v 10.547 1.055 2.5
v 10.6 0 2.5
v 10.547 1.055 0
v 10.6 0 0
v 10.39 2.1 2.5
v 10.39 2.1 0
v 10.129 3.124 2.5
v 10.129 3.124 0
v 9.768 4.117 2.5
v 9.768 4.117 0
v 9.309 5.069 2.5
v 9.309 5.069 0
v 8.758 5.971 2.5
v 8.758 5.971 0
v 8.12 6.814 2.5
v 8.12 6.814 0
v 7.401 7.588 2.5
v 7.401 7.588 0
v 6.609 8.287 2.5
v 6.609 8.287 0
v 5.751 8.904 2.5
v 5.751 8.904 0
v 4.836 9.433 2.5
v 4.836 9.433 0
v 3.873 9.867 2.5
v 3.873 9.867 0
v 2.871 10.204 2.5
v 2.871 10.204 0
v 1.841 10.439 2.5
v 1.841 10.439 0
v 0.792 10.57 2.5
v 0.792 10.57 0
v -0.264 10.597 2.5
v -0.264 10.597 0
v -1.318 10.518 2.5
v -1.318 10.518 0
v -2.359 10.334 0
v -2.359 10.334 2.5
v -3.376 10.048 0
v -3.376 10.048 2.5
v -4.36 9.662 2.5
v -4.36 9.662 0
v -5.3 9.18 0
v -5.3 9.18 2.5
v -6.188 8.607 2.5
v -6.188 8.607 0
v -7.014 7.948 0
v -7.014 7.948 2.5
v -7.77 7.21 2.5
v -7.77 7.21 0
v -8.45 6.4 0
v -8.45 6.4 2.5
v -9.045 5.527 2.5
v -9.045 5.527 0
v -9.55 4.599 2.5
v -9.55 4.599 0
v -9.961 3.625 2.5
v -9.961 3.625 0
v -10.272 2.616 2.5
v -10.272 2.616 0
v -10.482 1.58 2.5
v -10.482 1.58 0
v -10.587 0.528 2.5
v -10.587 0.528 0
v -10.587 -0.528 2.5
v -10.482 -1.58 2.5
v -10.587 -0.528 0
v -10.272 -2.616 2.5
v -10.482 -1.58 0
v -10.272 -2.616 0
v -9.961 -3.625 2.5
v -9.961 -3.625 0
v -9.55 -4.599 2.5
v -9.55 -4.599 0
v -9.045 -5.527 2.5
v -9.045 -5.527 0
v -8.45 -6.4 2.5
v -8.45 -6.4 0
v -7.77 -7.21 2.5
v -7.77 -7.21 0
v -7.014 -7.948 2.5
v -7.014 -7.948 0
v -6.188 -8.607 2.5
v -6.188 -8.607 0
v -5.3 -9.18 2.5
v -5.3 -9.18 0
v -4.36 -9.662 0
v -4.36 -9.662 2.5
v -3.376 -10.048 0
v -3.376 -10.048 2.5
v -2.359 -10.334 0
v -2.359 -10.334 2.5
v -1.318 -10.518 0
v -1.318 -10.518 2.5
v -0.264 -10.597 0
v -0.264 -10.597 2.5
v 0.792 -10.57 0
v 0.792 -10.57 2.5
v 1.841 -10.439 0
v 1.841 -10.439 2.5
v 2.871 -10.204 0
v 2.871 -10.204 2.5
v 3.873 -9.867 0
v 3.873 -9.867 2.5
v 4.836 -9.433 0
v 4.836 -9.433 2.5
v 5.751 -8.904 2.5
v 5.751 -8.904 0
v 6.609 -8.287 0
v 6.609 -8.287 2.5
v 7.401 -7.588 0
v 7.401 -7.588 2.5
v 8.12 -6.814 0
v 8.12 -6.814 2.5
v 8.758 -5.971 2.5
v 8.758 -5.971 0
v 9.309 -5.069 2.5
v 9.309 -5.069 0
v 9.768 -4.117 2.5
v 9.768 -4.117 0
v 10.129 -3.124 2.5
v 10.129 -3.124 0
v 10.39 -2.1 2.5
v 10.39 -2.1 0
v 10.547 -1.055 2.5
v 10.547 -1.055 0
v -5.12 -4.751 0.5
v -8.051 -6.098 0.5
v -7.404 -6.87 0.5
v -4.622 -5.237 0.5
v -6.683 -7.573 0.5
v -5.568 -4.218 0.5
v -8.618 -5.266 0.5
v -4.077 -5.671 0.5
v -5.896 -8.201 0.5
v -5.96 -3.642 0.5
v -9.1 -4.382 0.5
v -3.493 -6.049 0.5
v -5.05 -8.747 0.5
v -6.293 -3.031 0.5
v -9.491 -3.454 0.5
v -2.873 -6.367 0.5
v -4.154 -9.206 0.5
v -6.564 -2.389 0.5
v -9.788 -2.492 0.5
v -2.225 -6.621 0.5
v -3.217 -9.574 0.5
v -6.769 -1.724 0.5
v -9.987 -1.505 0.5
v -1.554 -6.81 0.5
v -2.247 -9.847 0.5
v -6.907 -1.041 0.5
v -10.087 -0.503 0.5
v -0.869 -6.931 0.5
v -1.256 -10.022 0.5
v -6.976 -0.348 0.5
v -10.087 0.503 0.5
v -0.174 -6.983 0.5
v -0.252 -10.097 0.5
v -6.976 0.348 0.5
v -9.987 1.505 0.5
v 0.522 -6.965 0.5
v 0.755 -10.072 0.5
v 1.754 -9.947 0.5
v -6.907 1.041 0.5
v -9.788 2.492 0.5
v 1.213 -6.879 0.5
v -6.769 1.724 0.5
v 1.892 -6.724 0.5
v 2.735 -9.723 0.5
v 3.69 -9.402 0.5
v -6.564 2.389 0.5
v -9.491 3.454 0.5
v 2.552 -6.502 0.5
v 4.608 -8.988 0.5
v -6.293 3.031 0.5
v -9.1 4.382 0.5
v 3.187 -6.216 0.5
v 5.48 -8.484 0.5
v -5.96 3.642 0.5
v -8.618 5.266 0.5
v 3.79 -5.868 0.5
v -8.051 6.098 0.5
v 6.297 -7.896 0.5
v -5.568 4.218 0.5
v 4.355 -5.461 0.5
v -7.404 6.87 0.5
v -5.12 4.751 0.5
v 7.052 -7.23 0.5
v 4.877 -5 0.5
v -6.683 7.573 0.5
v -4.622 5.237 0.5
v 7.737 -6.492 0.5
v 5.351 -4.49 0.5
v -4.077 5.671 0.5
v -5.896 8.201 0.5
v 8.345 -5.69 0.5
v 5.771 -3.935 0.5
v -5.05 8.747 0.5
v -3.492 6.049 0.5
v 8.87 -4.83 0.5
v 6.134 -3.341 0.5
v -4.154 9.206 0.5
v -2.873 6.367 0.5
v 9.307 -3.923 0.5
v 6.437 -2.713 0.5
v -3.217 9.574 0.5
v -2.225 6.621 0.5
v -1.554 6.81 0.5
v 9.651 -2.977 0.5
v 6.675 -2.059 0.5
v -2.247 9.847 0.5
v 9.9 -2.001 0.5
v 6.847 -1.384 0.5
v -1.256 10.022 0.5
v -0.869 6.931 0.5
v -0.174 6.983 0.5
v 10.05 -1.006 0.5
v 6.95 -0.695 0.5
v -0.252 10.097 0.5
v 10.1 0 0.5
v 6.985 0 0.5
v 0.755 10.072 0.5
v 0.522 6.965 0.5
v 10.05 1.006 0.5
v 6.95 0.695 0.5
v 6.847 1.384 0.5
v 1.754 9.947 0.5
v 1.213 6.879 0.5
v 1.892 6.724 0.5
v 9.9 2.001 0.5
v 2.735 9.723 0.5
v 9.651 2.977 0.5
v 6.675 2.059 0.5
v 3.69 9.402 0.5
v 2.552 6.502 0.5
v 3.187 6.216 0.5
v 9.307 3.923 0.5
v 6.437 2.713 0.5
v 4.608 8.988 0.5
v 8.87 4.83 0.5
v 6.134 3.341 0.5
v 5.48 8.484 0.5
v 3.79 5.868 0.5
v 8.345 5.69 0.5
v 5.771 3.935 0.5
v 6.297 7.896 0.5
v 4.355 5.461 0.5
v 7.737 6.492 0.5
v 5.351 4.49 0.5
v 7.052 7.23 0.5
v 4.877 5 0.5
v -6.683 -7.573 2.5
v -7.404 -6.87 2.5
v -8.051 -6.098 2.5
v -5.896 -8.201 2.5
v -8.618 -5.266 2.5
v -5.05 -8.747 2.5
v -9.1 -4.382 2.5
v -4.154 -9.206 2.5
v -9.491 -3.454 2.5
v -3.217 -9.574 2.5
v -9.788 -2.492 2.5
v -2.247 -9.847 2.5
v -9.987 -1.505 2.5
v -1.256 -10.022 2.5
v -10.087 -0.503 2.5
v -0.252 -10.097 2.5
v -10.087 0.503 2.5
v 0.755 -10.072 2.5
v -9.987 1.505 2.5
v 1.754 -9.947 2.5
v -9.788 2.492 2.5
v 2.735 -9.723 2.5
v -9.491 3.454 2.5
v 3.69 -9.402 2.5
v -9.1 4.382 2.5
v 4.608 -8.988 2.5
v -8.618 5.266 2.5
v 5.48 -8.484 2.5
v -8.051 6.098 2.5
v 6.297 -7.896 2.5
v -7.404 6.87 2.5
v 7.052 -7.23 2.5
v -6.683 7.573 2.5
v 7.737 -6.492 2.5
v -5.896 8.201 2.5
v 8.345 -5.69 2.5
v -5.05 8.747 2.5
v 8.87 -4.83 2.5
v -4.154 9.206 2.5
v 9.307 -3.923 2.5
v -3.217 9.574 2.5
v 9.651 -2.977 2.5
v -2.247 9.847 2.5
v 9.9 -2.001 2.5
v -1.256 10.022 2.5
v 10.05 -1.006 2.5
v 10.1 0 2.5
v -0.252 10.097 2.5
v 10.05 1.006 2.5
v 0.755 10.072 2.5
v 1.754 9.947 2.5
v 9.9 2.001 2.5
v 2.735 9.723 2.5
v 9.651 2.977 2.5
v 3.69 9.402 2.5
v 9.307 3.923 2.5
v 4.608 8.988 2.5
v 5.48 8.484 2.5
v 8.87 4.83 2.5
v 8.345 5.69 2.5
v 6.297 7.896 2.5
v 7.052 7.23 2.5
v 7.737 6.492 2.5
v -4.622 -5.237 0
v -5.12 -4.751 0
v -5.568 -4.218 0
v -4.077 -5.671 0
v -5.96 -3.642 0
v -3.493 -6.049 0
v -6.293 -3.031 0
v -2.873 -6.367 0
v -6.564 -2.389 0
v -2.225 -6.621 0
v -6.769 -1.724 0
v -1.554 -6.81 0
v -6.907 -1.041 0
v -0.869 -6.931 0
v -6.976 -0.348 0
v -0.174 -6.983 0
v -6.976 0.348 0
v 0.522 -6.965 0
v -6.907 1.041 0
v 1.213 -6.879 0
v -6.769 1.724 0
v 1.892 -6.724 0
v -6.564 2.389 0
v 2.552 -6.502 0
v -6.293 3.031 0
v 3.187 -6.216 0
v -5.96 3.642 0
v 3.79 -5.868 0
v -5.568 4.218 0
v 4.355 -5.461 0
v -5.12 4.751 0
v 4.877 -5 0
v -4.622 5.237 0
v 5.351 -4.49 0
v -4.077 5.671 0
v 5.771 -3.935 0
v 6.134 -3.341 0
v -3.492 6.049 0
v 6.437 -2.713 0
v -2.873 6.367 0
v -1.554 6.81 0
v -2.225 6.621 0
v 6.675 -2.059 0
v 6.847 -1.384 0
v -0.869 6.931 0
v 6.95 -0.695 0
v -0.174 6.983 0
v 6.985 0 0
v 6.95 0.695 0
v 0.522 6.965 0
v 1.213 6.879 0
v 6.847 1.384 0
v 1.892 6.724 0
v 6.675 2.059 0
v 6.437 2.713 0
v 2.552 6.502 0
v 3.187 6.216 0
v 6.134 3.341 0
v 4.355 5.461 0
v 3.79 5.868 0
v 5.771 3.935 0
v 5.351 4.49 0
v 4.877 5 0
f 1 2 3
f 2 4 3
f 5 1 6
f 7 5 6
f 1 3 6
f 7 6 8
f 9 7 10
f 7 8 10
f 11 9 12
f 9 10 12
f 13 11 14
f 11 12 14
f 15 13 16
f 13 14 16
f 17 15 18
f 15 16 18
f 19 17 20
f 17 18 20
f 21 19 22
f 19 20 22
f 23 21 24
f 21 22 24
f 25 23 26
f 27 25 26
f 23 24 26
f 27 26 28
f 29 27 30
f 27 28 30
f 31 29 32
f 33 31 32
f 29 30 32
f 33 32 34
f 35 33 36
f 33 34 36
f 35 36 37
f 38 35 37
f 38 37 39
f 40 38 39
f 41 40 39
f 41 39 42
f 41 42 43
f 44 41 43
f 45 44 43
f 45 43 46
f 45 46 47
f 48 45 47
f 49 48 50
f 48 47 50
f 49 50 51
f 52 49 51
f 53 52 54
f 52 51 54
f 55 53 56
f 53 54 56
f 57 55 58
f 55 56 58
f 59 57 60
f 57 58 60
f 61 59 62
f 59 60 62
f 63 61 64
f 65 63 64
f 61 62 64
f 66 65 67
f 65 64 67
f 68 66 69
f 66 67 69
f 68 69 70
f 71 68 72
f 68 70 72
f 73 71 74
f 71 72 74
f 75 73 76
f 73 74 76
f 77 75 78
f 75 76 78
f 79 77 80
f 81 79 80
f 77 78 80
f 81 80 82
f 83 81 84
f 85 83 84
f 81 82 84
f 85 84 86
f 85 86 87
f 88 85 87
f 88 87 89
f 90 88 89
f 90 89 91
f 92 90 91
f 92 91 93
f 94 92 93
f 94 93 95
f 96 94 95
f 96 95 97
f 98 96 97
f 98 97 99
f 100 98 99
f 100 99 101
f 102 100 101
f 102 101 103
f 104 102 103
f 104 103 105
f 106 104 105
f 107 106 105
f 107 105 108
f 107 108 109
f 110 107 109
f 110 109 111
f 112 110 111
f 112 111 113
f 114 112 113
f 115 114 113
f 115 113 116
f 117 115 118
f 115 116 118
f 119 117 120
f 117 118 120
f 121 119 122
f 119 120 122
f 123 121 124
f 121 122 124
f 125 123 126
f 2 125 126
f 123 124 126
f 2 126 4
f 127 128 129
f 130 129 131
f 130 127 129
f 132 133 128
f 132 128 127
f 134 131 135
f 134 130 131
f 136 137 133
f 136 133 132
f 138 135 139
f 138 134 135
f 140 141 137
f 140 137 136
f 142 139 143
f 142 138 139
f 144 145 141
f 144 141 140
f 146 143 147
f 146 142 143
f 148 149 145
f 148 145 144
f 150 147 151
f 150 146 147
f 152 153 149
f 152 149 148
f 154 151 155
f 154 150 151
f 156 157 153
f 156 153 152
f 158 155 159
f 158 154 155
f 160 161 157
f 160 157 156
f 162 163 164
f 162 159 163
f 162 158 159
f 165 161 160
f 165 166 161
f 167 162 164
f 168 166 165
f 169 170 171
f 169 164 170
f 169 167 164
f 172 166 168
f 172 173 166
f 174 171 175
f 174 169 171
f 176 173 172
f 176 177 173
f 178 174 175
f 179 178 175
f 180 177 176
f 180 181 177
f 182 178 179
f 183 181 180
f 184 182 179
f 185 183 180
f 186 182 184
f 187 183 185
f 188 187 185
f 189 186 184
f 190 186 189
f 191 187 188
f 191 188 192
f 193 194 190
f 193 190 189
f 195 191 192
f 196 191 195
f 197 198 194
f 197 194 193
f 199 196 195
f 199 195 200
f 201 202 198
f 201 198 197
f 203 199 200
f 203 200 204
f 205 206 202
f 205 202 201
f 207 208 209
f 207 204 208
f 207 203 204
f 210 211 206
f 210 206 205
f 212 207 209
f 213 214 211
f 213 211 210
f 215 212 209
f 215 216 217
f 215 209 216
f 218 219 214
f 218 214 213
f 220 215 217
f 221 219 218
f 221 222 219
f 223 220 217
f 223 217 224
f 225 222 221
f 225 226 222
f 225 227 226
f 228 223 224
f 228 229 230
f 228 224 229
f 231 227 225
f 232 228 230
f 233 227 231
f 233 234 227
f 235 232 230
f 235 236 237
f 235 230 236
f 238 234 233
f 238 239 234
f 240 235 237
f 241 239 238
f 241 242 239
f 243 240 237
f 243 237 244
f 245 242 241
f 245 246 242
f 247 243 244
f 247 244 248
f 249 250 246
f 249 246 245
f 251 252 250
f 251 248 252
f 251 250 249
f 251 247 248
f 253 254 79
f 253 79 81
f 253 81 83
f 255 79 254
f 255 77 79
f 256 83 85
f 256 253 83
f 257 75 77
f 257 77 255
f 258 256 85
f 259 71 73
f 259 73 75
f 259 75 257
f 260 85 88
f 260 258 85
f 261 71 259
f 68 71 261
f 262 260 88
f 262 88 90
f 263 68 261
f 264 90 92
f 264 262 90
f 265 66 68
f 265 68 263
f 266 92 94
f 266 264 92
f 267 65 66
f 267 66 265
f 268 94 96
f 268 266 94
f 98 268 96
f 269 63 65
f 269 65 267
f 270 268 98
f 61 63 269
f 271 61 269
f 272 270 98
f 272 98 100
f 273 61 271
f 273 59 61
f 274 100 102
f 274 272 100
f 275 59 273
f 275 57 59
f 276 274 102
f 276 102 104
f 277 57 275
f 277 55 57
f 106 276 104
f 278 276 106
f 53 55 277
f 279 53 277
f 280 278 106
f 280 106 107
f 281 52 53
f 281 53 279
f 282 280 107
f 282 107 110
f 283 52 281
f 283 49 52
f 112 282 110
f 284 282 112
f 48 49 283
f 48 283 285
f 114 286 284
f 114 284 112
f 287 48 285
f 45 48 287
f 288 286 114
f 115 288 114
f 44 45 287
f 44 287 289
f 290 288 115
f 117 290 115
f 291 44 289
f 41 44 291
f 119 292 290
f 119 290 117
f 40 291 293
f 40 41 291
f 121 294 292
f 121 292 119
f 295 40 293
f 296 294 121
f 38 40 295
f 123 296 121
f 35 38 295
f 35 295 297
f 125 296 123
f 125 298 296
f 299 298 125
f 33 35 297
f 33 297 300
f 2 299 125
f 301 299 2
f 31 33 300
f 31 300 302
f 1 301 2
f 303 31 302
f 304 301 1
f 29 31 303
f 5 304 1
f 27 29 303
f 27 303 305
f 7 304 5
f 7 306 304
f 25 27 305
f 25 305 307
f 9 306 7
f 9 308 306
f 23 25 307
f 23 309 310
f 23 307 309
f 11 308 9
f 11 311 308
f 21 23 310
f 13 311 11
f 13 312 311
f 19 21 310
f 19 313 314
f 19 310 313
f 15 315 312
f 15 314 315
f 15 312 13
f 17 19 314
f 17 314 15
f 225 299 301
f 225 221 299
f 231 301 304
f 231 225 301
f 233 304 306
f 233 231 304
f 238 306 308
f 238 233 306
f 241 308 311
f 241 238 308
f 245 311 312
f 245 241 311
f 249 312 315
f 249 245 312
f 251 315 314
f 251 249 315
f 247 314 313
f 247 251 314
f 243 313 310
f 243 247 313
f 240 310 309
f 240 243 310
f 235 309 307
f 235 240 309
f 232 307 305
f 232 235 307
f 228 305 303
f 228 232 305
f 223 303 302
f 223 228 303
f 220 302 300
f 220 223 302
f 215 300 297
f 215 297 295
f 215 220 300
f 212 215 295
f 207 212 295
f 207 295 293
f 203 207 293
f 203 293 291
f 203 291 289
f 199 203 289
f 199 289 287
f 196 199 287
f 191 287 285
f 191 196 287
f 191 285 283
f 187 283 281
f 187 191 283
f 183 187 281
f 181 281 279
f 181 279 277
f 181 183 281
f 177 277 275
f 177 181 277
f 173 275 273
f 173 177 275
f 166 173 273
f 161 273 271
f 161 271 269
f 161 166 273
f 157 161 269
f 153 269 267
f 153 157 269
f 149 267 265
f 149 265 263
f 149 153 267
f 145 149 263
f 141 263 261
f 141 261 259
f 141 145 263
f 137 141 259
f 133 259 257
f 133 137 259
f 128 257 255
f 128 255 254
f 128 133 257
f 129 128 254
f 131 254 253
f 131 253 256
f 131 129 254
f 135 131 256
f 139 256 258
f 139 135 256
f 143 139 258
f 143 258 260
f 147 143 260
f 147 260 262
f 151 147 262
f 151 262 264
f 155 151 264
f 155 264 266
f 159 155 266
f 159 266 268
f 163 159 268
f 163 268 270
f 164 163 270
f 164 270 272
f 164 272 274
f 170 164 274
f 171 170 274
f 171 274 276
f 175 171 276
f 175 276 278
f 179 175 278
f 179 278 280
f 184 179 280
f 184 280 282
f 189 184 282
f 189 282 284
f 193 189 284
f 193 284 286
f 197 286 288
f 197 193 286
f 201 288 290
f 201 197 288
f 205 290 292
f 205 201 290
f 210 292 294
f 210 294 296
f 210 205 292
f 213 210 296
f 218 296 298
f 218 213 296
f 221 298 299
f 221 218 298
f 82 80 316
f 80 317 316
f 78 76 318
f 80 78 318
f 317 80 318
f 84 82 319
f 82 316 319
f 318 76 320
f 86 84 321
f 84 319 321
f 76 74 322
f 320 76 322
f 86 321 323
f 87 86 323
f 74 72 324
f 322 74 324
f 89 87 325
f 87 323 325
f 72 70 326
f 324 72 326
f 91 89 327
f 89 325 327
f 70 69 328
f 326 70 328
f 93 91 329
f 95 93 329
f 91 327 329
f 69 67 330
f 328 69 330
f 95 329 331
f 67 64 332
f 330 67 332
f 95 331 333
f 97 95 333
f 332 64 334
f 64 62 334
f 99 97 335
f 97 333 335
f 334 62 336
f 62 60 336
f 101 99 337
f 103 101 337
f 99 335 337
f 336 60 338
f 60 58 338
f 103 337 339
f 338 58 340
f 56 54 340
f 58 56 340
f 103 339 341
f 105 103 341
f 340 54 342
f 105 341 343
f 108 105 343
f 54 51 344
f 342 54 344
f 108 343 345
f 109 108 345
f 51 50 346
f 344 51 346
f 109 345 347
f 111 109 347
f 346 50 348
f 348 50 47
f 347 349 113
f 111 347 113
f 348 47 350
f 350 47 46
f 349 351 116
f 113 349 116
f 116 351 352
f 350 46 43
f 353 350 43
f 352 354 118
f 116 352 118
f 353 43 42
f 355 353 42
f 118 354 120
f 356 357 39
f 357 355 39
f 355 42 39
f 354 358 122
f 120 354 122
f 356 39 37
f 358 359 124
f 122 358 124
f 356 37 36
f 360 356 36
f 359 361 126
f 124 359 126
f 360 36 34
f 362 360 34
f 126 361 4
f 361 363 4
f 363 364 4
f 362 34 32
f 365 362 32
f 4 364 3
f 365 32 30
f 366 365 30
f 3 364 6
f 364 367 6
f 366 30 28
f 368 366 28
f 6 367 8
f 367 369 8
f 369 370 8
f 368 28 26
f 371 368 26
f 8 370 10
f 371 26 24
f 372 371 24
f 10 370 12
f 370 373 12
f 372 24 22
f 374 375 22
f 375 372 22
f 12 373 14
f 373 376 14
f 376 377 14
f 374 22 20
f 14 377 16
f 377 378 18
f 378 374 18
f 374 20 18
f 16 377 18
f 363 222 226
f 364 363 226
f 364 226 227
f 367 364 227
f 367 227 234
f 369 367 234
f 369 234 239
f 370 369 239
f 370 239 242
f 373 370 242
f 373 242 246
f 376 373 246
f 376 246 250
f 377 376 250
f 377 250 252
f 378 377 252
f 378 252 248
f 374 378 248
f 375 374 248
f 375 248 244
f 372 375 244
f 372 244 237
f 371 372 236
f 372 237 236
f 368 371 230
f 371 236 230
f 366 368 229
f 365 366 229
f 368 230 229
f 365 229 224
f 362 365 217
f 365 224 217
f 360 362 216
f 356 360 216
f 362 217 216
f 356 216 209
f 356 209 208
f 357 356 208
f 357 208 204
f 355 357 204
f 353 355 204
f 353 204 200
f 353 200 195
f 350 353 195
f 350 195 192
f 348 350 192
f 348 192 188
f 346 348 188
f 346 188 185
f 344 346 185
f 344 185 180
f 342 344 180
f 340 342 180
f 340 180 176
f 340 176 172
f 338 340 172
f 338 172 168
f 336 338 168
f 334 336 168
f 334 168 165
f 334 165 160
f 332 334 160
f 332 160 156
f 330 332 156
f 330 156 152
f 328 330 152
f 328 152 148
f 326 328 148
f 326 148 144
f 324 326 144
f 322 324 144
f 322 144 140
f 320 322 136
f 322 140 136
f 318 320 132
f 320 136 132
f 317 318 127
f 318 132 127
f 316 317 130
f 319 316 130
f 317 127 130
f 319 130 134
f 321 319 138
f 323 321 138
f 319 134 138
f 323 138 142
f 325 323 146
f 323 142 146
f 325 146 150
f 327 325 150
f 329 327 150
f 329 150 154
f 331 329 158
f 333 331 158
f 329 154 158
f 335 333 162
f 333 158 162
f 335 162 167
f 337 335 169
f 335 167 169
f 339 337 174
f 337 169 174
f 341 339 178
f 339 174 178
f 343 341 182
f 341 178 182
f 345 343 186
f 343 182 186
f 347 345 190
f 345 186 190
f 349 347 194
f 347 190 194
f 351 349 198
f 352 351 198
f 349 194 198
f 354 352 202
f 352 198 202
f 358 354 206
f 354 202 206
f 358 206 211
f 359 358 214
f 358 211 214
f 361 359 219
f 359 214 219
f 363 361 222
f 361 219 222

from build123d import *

# Parameters (mm, degrees)
F0_R     = 10.6
F1_DEPTH = 1
F2_T     = -0.5
F3_R     = 6.985
F4_DEPTH = 25
F5_R     = 10.6
F5_R_2   = 10.1
F6_DEPTH = 1.5


with BuildPart() as f1:
    # F0 (on Top) → F1 (new body)
    with BuildSketch(Plane.XY):
        Circle(F0_R)
    extrude(amount=F1_DEPTH)

    # F2
    f2_openings = [f1.faces().sort_by_distance(p)[0] for p in [
        (0, 0, 1),
    ]]
    offset(amount=F2_T, openings=f2_openings)

    # F3 (on face) → F4 (cut)
    with BuildSketch(Plane.XY.offset(0.5)):
        Circle(F3_R)
    extrude(amount=-F4_DEPTH, mode=Mode.SUBTRACT)

    # F5 (on face) → F6 (join)
    with BuildSketch(Plane.XY.offset(1)):
        Circle(F5_R)
        Circle(F5_R_2, mode=Mode.SUBTRACT)
    extrude(amount=F6_DEPTH)


solid = f1.part
